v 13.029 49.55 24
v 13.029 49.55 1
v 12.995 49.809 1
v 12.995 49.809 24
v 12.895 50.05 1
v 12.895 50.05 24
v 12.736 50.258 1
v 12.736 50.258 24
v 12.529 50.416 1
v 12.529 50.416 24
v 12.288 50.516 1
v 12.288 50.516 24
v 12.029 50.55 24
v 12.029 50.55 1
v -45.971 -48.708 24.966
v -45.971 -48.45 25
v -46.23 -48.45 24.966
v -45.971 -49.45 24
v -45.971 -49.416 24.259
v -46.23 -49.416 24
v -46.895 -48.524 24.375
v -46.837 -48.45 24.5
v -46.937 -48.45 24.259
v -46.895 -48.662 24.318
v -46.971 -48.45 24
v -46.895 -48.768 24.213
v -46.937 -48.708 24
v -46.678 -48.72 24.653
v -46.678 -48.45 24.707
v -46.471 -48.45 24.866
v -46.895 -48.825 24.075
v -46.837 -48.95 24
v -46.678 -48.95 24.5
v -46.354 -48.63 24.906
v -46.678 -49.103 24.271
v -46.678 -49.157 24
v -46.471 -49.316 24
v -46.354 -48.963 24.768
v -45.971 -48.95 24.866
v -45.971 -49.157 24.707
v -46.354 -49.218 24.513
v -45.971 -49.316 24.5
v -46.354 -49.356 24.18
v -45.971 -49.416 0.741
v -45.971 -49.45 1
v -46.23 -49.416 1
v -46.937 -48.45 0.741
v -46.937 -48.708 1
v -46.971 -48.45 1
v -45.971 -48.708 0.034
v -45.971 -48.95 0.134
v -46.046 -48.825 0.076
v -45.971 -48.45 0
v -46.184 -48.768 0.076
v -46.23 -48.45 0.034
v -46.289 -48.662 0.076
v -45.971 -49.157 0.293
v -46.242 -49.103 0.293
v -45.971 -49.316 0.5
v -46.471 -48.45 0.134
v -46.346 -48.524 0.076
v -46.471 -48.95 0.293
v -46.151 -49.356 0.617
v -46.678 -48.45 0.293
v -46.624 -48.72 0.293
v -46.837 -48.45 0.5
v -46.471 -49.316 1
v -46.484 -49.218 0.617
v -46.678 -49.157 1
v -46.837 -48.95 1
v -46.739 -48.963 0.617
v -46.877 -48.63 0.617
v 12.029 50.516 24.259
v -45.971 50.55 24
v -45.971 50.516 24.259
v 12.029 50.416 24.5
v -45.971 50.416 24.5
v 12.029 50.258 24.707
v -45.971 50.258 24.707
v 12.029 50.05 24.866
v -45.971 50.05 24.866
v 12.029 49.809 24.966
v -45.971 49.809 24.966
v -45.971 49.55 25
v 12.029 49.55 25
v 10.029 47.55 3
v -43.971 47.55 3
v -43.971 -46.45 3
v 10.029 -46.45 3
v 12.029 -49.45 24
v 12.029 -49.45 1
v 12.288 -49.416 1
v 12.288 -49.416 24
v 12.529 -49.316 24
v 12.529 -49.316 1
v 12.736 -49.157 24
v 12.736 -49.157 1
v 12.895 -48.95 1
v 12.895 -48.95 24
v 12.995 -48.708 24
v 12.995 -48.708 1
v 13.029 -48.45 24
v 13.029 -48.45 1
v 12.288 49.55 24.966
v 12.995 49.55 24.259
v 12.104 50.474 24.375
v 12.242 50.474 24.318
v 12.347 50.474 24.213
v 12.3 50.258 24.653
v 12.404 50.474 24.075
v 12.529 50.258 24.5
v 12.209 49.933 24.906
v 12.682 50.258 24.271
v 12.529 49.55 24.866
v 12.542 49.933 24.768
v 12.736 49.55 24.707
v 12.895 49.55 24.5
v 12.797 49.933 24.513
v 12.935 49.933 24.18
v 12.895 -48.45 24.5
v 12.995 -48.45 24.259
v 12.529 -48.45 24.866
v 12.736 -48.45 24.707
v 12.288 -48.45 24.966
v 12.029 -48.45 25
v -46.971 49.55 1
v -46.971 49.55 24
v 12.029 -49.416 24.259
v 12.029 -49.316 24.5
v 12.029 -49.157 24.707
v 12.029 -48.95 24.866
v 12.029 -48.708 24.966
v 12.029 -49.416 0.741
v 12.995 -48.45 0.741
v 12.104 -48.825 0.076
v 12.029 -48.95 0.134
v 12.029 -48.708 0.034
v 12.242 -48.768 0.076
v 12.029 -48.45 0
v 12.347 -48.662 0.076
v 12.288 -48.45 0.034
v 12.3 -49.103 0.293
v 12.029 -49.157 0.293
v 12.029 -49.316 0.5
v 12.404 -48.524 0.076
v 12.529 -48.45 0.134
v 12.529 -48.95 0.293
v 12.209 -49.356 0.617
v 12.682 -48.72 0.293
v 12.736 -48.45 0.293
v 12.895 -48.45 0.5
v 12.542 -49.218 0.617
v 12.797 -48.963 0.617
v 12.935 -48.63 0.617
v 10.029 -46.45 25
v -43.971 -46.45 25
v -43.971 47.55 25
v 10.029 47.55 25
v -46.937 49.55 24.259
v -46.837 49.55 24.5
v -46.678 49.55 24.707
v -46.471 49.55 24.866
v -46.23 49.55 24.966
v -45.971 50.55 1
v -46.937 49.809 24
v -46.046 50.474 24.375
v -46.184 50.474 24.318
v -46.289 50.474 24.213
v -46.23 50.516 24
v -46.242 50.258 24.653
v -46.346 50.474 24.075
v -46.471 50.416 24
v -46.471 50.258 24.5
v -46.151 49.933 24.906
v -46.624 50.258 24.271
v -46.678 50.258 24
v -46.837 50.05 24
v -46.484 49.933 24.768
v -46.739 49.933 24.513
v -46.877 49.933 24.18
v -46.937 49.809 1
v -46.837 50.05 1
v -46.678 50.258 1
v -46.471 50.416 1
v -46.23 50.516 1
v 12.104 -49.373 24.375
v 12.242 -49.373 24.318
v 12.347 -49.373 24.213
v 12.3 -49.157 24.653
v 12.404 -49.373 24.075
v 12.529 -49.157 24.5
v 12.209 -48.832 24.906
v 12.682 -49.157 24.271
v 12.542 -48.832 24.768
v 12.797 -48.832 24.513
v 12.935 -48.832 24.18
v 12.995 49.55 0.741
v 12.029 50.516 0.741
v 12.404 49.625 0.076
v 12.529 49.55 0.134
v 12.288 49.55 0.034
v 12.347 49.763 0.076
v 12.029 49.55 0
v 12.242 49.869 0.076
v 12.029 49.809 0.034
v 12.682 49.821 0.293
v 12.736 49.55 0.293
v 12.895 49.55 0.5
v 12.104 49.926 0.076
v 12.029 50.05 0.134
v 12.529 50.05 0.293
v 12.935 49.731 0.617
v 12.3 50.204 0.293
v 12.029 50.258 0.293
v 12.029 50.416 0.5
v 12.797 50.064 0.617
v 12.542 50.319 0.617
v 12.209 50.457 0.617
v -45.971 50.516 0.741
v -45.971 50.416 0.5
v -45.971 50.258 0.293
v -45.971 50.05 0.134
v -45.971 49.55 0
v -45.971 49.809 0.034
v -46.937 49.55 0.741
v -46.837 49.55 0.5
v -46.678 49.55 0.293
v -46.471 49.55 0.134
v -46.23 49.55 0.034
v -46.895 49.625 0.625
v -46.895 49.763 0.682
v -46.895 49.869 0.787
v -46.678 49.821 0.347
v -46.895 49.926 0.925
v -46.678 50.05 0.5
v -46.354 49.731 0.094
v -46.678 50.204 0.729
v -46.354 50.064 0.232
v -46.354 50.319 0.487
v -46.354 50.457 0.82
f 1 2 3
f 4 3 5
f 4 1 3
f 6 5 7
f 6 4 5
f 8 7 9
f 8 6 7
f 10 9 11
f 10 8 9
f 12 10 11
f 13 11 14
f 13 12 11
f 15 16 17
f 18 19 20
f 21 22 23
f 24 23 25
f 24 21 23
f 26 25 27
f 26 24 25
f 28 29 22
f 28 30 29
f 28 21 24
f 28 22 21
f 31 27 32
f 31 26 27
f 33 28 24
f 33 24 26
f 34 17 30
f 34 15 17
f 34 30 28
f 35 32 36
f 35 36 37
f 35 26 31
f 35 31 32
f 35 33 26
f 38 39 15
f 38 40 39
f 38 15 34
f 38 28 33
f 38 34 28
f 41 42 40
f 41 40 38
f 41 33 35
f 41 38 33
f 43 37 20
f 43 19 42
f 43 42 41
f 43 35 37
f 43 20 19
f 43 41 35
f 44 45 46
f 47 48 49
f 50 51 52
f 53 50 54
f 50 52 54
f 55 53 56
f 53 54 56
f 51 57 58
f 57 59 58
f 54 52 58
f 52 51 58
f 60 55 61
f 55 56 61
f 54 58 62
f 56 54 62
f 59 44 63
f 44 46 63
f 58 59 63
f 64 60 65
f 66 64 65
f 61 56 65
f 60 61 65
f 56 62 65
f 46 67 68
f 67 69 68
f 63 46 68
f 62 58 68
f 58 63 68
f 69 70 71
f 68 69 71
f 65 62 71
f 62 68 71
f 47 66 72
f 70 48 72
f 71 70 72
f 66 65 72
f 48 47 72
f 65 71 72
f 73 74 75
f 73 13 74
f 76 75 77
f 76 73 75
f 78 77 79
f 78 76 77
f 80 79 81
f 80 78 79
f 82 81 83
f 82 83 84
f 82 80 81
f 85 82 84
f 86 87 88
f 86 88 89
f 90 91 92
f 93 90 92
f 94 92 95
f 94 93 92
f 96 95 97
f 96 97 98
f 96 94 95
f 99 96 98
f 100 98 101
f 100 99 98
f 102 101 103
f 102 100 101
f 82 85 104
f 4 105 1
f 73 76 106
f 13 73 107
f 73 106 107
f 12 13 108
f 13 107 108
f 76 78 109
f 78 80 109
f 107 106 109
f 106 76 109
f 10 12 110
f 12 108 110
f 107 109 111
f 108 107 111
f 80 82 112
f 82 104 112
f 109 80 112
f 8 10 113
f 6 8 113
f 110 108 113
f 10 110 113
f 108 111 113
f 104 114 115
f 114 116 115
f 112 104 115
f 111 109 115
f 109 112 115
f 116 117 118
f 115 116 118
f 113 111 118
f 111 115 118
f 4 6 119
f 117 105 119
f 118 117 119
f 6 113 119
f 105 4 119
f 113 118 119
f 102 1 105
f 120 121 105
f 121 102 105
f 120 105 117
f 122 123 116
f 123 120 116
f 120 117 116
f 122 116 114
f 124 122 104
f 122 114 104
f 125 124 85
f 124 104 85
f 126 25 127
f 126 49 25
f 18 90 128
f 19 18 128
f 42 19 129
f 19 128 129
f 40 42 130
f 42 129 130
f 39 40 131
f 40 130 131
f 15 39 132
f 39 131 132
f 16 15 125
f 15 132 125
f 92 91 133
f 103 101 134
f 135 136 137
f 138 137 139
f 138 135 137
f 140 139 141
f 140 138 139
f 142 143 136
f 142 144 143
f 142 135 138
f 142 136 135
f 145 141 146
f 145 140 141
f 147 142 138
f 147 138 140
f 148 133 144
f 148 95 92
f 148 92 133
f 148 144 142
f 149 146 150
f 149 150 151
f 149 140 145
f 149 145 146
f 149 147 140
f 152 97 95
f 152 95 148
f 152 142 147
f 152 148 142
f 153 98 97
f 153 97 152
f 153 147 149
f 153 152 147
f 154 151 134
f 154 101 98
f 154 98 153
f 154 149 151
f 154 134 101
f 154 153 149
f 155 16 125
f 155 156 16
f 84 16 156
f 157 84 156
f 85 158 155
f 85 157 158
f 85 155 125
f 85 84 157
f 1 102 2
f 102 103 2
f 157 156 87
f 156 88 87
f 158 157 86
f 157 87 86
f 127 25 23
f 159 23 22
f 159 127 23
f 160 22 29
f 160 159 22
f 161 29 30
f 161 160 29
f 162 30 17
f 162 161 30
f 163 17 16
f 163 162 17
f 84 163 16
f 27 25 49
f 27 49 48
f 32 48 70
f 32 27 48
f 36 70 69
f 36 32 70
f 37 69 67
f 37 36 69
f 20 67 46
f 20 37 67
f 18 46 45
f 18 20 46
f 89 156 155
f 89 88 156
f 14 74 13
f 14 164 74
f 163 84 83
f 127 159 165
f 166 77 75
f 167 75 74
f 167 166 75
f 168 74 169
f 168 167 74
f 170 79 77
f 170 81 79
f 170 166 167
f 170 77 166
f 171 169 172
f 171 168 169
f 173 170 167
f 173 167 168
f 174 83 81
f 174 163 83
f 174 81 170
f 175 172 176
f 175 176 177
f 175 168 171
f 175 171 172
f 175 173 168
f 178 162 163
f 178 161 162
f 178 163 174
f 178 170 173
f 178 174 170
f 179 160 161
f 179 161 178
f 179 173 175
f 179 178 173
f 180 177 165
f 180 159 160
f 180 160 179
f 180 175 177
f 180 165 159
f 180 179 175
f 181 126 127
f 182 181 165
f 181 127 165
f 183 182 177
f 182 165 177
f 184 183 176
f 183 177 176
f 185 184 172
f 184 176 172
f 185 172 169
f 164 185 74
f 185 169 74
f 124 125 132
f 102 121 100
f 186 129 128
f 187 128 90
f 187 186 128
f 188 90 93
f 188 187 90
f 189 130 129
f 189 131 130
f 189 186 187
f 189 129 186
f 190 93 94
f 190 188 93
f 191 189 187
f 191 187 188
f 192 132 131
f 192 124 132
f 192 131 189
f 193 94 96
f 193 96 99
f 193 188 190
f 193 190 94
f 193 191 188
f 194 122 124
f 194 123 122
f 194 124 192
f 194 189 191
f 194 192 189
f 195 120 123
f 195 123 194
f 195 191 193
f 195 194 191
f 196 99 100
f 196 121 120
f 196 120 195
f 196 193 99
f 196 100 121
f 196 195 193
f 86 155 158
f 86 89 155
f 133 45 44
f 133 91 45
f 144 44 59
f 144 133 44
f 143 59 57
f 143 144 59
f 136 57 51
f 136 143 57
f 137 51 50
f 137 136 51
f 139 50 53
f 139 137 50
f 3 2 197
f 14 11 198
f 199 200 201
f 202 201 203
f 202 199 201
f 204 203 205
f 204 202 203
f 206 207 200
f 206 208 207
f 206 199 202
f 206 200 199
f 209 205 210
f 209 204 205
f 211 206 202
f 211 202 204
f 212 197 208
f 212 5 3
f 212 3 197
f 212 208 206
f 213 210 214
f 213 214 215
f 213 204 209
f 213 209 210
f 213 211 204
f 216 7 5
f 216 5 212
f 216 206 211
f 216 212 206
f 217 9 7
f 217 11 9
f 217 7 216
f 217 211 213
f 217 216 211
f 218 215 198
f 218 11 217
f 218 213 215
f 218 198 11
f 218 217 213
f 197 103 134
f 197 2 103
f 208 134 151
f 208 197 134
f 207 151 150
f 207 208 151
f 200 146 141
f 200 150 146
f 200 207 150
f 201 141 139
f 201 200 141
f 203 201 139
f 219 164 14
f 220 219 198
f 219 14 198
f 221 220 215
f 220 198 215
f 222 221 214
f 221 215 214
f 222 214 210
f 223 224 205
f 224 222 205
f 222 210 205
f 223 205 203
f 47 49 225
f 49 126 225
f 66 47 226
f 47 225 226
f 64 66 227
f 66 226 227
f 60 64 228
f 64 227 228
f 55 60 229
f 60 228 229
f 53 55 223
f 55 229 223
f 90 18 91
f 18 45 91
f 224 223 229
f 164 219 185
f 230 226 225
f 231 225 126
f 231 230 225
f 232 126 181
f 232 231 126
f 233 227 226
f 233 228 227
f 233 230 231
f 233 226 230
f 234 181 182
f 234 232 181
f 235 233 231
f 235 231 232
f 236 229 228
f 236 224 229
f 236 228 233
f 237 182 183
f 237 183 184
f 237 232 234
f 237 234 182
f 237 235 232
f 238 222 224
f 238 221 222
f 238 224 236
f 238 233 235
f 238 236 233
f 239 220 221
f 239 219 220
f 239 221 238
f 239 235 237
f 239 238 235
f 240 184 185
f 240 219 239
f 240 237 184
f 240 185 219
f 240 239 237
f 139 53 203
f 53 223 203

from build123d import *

# Parameters (mm, degrees)
F0_W     = 60
F0_H     = 100
F1_DEPTH = 25
F2_T     = -3
F3_R     = 1


with BuildPart() as f1:
    # F0 (on Top) → F1 (new body)
    with BuildSketch(Plane.XY):
        with Locations((-16.971023, 0.550396)):
            Rectangle(F0_W, F0_H)
    extrude(amount=F1_DEPTH)

    # F2
    f2_openings = [f1.faces().sort_by_distance(p)[0] for p in [
        (-16.971023, 0.550396, 25),
    ]]
    offset(amount=F2_T, openings=f2_openings)

    # F3
    f3_edges = [f1.edges().sort_by_distance(p)[0] for p in [
        (13.028977, 0.550396, 25),
        (-16.971023, -49.449604, 25),
        (-46.971023, 0.550396, 25),
        (-16.971023, 50.550396, 25),
        (13.028977, 50.550396, 12.5),
        (13.028977, -49.449604, 12.5),
        (-46.971023, -49.449604, 12.5),
        (-16.971023, -49.449604, 0),
        (13.028977, 0.550396, 0),
        (-16.971023, 50.550396, 0),
        (-46.971023, 0.550396, 0),
        (-46.971023, 50.550396, 12.5),
    ]]
    fillet(f3_edges, radius=F3_R)


solid = f1.part
